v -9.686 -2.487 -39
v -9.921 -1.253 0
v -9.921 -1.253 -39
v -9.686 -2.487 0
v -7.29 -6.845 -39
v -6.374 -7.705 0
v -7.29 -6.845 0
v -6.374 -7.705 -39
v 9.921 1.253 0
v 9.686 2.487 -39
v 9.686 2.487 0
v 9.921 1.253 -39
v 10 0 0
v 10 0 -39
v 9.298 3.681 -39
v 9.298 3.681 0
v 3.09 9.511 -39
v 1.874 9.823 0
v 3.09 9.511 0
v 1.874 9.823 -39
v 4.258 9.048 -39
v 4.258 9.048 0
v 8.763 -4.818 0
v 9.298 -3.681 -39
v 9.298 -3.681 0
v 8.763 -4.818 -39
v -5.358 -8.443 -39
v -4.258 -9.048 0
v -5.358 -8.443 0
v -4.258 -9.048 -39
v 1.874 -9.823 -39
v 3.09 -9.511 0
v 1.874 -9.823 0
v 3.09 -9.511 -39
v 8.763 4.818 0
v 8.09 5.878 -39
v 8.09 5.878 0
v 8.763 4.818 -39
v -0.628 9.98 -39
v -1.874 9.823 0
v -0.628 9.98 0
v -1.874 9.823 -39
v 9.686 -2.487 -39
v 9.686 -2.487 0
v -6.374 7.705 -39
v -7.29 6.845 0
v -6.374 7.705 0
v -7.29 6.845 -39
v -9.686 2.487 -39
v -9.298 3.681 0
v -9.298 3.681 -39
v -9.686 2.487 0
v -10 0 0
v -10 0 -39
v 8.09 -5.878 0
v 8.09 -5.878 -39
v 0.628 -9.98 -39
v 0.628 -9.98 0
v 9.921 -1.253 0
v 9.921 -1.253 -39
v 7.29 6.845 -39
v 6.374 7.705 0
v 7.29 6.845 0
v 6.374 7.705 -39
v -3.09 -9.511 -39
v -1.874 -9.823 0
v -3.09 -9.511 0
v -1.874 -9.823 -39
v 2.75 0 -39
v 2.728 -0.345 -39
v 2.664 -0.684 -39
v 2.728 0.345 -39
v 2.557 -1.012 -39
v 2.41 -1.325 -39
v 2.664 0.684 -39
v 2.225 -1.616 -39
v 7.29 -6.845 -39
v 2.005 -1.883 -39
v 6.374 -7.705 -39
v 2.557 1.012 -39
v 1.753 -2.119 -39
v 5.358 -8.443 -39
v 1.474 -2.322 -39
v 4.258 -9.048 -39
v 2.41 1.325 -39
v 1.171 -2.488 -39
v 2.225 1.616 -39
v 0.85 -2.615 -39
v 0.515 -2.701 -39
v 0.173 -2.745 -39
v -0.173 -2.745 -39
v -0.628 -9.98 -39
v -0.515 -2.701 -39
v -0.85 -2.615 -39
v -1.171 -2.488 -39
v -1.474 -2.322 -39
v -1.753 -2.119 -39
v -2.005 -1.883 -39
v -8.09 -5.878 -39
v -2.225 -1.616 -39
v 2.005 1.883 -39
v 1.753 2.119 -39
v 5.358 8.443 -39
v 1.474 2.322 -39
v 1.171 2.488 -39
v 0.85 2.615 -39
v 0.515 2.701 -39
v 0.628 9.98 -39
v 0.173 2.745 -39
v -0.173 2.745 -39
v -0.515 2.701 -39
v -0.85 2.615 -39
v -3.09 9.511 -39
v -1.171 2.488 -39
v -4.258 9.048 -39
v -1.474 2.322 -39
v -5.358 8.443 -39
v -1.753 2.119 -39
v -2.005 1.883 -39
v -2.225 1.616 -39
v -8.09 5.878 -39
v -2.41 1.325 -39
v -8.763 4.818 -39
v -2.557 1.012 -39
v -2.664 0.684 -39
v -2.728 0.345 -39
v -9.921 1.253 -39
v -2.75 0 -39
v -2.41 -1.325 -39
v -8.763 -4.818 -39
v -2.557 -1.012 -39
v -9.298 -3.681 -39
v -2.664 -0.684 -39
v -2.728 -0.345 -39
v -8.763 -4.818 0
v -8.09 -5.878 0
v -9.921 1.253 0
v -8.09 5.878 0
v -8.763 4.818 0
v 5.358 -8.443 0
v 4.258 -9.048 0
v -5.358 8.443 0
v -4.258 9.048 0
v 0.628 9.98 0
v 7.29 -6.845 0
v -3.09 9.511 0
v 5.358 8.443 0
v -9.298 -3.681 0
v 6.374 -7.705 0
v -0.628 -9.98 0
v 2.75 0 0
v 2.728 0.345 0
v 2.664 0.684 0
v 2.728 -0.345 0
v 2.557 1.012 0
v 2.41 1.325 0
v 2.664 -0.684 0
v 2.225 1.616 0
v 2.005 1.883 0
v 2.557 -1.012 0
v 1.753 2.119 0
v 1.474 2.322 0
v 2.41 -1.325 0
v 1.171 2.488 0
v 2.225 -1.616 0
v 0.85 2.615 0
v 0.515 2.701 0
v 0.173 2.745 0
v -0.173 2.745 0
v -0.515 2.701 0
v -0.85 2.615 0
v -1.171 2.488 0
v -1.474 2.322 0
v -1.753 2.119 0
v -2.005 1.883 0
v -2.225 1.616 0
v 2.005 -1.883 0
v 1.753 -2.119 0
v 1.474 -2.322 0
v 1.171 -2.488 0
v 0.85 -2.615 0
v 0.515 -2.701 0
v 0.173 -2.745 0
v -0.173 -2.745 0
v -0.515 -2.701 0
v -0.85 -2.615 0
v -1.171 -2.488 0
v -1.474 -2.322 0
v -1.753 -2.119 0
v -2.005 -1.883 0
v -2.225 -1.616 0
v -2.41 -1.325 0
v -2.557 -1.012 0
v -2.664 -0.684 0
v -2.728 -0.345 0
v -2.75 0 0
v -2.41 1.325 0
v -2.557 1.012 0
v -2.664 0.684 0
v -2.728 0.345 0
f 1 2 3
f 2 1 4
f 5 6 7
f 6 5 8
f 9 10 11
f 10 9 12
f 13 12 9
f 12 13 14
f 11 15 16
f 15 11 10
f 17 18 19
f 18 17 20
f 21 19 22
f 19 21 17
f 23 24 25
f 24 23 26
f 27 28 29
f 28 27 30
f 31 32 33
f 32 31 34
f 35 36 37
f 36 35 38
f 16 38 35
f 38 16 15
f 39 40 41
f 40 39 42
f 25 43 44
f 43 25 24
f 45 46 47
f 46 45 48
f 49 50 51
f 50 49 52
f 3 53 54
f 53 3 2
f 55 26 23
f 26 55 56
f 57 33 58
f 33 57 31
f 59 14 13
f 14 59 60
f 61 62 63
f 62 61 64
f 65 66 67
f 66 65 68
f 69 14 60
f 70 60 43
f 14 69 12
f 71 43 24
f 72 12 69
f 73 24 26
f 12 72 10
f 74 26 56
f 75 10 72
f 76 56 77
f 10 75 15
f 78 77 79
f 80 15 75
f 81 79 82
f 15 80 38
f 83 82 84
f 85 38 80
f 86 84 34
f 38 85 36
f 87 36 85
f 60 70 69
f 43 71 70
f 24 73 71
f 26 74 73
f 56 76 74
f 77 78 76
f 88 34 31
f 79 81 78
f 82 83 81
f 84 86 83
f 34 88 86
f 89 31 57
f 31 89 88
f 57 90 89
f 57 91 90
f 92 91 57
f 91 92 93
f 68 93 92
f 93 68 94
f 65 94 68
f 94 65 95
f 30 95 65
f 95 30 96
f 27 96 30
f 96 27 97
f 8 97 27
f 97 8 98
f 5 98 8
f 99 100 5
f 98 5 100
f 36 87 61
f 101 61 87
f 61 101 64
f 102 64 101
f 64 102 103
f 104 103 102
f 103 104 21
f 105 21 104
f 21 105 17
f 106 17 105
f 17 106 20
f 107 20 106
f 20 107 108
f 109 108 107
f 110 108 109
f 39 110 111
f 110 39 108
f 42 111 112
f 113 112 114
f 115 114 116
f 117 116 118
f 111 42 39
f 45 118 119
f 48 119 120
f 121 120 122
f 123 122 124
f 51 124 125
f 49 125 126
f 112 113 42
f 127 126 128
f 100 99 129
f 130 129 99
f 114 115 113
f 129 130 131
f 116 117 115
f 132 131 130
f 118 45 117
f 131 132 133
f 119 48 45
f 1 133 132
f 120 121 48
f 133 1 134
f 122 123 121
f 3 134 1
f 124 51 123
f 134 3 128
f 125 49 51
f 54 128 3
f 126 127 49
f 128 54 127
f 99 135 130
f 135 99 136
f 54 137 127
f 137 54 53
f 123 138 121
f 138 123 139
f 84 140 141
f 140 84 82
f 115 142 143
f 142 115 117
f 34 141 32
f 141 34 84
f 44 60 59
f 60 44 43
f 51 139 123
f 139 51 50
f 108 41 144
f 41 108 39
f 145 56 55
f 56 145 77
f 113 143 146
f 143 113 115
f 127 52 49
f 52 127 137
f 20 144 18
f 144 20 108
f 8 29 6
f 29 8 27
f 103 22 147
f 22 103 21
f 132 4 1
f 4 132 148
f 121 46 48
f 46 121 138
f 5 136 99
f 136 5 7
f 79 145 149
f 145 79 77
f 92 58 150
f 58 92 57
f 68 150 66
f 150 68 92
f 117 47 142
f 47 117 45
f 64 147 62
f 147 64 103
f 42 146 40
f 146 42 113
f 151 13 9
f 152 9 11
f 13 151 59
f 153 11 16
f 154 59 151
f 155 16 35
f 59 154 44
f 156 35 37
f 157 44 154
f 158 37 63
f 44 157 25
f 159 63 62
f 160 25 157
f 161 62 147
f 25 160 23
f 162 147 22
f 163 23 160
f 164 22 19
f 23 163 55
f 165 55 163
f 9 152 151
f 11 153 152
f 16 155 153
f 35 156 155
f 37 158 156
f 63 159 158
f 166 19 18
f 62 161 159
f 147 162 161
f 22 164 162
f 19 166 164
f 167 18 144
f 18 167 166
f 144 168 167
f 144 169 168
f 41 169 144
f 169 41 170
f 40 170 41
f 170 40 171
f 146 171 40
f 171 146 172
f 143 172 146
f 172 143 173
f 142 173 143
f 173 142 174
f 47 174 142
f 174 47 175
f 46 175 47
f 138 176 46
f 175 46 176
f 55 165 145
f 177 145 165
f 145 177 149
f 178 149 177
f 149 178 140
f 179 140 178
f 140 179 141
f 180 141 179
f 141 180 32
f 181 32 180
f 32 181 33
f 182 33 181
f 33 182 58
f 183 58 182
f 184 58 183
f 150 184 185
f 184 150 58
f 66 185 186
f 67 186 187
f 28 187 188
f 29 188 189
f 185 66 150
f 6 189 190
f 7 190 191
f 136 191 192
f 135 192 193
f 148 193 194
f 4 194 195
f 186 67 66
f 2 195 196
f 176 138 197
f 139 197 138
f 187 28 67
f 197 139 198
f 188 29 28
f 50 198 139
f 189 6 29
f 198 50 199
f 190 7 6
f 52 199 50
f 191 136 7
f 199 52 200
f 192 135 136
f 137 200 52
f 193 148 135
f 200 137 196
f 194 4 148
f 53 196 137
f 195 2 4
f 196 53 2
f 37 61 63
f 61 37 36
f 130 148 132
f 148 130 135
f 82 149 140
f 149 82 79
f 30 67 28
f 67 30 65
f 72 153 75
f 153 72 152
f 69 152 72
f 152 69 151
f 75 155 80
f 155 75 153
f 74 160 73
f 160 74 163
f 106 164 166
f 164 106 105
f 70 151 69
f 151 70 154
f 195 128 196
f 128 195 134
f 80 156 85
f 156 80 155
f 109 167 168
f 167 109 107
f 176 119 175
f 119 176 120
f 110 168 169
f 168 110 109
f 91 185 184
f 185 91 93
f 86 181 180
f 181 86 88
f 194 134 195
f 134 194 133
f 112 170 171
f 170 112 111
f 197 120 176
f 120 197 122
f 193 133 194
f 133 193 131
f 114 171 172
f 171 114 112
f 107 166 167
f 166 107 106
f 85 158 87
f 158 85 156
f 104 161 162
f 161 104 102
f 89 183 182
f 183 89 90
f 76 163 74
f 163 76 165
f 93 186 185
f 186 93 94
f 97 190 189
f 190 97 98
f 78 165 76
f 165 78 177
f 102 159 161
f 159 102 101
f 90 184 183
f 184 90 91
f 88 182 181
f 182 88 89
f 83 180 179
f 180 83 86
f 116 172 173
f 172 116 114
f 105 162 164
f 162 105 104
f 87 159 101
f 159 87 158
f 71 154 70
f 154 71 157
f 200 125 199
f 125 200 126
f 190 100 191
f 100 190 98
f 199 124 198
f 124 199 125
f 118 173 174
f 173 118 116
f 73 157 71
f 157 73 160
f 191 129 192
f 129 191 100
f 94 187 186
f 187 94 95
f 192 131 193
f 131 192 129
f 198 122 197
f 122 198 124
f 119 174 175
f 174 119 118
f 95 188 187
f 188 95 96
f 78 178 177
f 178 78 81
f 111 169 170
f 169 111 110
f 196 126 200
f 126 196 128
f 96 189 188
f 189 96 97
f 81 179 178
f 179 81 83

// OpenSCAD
$fn = 50;


difference() {
	union() {
		translate(v = [0, 0, -39.0000000000]) {
			cylinder(h = 39, r = 10.0000000000);
		}
		cylinder(h = 0, r = 19.0000000000);
	}
	union() {
		#translate(v = [0, 0, -39]) {
			cylinder(h = 39, r = 2.7500000000);
		}
	}
}
